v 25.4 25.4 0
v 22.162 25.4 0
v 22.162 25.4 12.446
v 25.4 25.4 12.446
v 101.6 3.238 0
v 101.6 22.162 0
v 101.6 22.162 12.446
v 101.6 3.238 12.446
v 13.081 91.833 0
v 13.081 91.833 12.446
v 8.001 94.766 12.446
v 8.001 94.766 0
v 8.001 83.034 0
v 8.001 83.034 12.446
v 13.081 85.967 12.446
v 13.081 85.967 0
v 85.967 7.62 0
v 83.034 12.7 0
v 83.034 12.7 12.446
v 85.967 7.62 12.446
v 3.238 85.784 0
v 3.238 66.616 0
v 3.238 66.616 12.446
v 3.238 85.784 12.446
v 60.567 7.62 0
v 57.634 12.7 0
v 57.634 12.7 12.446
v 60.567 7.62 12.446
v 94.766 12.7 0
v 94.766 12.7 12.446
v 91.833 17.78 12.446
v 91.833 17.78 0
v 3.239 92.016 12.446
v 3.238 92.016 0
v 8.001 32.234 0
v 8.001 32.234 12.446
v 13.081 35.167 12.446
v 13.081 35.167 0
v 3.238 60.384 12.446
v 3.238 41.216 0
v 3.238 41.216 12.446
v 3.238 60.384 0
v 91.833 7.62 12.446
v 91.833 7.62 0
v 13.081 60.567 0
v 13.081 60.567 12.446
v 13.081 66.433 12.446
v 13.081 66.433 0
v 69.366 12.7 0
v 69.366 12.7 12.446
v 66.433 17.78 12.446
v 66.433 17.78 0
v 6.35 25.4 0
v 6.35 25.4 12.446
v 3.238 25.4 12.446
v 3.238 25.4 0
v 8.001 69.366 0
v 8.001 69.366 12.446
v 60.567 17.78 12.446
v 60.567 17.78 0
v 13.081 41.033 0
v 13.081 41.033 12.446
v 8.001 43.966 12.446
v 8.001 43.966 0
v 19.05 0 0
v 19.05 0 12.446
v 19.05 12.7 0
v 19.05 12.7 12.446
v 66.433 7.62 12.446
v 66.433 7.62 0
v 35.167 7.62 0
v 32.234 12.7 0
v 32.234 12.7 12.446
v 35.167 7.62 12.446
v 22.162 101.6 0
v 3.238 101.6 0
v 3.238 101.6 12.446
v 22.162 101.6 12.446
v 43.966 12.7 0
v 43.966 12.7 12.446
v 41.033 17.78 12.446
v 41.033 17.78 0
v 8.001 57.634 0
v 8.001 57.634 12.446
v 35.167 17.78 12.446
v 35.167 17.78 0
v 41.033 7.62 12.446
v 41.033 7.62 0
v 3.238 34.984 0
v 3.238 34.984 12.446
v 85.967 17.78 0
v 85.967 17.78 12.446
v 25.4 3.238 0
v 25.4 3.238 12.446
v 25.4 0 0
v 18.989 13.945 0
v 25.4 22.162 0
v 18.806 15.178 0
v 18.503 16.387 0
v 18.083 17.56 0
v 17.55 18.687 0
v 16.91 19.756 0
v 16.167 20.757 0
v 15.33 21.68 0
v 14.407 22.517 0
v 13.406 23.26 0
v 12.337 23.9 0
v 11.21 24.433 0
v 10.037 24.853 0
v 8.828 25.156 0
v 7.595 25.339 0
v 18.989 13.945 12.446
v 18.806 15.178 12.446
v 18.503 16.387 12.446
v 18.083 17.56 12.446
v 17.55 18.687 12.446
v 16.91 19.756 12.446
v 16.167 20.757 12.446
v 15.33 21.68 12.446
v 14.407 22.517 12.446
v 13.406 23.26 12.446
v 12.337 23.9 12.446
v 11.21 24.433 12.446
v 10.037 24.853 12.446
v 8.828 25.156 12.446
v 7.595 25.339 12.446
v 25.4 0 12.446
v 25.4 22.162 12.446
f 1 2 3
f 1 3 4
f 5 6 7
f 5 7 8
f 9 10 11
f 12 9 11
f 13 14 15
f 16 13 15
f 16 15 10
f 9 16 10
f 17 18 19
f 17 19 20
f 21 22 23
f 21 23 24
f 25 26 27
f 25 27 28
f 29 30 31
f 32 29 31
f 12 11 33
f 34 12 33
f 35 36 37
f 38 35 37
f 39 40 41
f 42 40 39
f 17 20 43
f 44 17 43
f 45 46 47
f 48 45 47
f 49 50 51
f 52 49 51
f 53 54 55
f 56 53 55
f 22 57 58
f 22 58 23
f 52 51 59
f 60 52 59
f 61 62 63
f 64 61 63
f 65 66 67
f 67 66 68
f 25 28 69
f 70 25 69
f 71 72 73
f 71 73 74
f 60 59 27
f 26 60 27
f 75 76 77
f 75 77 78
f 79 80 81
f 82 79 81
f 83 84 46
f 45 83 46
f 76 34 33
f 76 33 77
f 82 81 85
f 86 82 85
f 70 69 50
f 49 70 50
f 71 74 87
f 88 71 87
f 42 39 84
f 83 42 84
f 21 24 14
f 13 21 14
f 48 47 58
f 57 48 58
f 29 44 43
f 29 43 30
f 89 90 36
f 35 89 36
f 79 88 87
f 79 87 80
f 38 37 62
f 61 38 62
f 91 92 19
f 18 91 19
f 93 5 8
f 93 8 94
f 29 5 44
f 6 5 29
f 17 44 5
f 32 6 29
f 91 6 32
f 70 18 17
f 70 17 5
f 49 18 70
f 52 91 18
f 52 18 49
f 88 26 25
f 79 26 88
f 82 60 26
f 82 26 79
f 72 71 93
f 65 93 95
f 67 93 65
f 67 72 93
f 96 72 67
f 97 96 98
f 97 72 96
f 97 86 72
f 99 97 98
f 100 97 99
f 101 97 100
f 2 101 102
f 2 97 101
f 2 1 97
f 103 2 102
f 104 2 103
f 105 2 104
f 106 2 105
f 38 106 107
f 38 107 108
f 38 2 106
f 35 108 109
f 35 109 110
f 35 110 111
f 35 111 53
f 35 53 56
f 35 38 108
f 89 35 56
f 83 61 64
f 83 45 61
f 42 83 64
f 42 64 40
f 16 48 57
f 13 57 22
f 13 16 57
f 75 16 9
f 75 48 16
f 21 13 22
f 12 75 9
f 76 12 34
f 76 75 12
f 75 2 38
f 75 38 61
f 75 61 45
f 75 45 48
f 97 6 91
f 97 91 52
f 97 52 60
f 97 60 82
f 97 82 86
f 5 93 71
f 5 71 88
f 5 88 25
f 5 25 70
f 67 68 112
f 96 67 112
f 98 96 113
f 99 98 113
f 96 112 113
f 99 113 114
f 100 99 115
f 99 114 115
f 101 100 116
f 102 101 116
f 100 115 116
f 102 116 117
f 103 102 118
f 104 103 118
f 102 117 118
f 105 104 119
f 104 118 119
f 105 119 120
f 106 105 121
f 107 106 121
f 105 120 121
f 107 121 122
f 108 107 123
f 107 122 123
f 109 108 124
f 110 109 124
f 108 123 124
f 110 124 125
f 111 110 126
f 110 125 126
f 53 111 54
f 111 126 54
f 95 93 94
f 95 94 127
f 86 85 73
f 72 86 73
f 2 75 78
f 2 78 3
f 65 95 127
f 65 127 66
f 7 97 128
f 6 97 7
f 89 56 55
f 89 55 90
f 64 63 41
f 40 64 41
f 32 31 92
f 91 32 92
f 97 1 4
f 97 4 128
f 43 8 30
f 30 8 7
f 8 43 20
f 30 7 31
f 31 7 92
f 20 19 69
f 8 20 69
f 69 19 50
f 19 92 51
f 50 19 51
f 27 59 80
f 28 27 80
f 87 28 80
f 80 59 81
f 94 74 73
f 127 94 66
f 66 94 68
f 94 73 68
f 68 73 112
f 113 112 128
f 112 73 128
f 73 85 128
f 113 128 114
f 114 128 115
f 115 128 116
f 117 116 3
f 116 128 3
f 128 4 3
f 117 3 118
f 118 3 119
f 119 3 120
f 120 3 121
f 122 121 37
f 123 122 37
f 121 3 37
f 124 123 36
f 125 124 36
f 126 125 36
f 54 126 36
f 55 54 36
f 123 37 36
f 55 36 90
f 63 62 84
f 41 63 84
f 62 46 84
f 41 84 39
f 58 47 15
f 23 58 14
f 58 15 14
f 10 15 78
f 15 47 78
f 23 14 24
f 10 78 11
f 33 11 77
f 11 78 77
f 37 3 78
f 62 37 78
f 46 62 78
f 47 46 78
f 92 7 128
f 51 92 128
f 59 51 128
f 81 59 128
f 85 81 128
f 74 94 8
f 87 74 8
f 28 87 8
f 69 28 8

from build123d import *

# Parameters (mm, degrees)
BOSS_EXTRUDE1_DEPTH    = 12.446
CUT_EXTRUDE1_DEPTH     = 145.222130465
F_10_CLEARANCE_HOLE1_D = 5.1054
CUT_EXTRUDE2_DEPTH     = 145.222130465


with BuildPart() as part:
    # Sketch1 → Boss-Extrude1 (new body)
    with BuildSketch(Plane.XY):
        Polygon((0, 0), (0, 25.4), (3.2385, 25.4), (3.2385, 101.6), (22.1615, 101.6), (22.1615, 25.4), (25.4, 25.4), (25.4, 22.1615), (101.6, 22.1615), (101.6, 3.2385), (25.4, 3.2385), (25.4, 0), align=None)
    extrude(amount=BOSS_EXTRUDE1_DEPTH)

    # Sketch2 → Cut-Extrude1 (cut, through all)
    with BuildSketch(Plane.XY.offset(12.446)):
        with BuildLine():
            Line((6.35, 25.4), (0, 25.4))
            Line((0, 25.4), (0, 0))
            Line((0, 0), (19.05, 0))
            Line((19.05, 0), (19.05, 12.7))
            ThreePointArc((19.05, 12.7), (15.330256121, 21.680256121), (6.35, 25.4))
        make_face()
    extrude(amount=-CUT_EXTRUDE1_DEPTH, mode=Mode.SUBTRACT)

    # #10 Clearance Hole1 (through all)
    with Locations(Plane.XY.offset(12.446)):
        with Locations((88.9, 12.7), (8.001, 88.9), (8.001, 63.5), (8.001, 38.1), (38.1, 12.7), (63.5, 12.7)):
            Hole(F_10_CLEARANCE_HOLE1_D / 2)

    # Sketch5 → Cut-Extrude2 (cut, through all)
    with BuildSketch(Plane.XY.offset(12.446)):
        Polygon((13.081, 85.967060633), (13.081, 91.832939367), (8.001, 94.765878735), (2.921, 91.832939367), (2.921, 85.967060633), (8.001, 83.034121265), align=None)
        Polygon((13.081, 60.567060633), (13.081, 66.432939367), (8.001, 69.365878735), (2.921, 66.432939367), (2.921, 60.567060633), (8.001, 57.634121265), align=None)
        Polygon((13.081, 35.167060633), (13.081, 41.032939367), (8.001, 43.965878735), (2.921, 41.032939367), (2.921, 35.167060633), (8.001, 32.234121265), align=None)
        Polygon((41.032939367, 7.62), (43.965878735, 12.7), (41.032939367, 17.78), (35.167060633, 17.78), (32.234121265, 12.7), (35.167060633, 7.62), align=None)
        Polygon((66.432939367, 7.62), (69.365878735, 12.7), (66.432939367, 17.78), (60.567060633, 17.78), (57.634121265, 12.7), (60.567060633, 7.62), align=None)
        Polygon((91.832939367, 7.62), (94.765878735, 12.7), (91.832939367, 17.78), (85.967060633, 17.78), (83.034121265, 12.7), (85.967060633, 7.62), align=None)
    extrude(amount=-CUT_EXTRUDE2_DEPTH, mode=Mode.SUBTRACT)


solid = part.part
